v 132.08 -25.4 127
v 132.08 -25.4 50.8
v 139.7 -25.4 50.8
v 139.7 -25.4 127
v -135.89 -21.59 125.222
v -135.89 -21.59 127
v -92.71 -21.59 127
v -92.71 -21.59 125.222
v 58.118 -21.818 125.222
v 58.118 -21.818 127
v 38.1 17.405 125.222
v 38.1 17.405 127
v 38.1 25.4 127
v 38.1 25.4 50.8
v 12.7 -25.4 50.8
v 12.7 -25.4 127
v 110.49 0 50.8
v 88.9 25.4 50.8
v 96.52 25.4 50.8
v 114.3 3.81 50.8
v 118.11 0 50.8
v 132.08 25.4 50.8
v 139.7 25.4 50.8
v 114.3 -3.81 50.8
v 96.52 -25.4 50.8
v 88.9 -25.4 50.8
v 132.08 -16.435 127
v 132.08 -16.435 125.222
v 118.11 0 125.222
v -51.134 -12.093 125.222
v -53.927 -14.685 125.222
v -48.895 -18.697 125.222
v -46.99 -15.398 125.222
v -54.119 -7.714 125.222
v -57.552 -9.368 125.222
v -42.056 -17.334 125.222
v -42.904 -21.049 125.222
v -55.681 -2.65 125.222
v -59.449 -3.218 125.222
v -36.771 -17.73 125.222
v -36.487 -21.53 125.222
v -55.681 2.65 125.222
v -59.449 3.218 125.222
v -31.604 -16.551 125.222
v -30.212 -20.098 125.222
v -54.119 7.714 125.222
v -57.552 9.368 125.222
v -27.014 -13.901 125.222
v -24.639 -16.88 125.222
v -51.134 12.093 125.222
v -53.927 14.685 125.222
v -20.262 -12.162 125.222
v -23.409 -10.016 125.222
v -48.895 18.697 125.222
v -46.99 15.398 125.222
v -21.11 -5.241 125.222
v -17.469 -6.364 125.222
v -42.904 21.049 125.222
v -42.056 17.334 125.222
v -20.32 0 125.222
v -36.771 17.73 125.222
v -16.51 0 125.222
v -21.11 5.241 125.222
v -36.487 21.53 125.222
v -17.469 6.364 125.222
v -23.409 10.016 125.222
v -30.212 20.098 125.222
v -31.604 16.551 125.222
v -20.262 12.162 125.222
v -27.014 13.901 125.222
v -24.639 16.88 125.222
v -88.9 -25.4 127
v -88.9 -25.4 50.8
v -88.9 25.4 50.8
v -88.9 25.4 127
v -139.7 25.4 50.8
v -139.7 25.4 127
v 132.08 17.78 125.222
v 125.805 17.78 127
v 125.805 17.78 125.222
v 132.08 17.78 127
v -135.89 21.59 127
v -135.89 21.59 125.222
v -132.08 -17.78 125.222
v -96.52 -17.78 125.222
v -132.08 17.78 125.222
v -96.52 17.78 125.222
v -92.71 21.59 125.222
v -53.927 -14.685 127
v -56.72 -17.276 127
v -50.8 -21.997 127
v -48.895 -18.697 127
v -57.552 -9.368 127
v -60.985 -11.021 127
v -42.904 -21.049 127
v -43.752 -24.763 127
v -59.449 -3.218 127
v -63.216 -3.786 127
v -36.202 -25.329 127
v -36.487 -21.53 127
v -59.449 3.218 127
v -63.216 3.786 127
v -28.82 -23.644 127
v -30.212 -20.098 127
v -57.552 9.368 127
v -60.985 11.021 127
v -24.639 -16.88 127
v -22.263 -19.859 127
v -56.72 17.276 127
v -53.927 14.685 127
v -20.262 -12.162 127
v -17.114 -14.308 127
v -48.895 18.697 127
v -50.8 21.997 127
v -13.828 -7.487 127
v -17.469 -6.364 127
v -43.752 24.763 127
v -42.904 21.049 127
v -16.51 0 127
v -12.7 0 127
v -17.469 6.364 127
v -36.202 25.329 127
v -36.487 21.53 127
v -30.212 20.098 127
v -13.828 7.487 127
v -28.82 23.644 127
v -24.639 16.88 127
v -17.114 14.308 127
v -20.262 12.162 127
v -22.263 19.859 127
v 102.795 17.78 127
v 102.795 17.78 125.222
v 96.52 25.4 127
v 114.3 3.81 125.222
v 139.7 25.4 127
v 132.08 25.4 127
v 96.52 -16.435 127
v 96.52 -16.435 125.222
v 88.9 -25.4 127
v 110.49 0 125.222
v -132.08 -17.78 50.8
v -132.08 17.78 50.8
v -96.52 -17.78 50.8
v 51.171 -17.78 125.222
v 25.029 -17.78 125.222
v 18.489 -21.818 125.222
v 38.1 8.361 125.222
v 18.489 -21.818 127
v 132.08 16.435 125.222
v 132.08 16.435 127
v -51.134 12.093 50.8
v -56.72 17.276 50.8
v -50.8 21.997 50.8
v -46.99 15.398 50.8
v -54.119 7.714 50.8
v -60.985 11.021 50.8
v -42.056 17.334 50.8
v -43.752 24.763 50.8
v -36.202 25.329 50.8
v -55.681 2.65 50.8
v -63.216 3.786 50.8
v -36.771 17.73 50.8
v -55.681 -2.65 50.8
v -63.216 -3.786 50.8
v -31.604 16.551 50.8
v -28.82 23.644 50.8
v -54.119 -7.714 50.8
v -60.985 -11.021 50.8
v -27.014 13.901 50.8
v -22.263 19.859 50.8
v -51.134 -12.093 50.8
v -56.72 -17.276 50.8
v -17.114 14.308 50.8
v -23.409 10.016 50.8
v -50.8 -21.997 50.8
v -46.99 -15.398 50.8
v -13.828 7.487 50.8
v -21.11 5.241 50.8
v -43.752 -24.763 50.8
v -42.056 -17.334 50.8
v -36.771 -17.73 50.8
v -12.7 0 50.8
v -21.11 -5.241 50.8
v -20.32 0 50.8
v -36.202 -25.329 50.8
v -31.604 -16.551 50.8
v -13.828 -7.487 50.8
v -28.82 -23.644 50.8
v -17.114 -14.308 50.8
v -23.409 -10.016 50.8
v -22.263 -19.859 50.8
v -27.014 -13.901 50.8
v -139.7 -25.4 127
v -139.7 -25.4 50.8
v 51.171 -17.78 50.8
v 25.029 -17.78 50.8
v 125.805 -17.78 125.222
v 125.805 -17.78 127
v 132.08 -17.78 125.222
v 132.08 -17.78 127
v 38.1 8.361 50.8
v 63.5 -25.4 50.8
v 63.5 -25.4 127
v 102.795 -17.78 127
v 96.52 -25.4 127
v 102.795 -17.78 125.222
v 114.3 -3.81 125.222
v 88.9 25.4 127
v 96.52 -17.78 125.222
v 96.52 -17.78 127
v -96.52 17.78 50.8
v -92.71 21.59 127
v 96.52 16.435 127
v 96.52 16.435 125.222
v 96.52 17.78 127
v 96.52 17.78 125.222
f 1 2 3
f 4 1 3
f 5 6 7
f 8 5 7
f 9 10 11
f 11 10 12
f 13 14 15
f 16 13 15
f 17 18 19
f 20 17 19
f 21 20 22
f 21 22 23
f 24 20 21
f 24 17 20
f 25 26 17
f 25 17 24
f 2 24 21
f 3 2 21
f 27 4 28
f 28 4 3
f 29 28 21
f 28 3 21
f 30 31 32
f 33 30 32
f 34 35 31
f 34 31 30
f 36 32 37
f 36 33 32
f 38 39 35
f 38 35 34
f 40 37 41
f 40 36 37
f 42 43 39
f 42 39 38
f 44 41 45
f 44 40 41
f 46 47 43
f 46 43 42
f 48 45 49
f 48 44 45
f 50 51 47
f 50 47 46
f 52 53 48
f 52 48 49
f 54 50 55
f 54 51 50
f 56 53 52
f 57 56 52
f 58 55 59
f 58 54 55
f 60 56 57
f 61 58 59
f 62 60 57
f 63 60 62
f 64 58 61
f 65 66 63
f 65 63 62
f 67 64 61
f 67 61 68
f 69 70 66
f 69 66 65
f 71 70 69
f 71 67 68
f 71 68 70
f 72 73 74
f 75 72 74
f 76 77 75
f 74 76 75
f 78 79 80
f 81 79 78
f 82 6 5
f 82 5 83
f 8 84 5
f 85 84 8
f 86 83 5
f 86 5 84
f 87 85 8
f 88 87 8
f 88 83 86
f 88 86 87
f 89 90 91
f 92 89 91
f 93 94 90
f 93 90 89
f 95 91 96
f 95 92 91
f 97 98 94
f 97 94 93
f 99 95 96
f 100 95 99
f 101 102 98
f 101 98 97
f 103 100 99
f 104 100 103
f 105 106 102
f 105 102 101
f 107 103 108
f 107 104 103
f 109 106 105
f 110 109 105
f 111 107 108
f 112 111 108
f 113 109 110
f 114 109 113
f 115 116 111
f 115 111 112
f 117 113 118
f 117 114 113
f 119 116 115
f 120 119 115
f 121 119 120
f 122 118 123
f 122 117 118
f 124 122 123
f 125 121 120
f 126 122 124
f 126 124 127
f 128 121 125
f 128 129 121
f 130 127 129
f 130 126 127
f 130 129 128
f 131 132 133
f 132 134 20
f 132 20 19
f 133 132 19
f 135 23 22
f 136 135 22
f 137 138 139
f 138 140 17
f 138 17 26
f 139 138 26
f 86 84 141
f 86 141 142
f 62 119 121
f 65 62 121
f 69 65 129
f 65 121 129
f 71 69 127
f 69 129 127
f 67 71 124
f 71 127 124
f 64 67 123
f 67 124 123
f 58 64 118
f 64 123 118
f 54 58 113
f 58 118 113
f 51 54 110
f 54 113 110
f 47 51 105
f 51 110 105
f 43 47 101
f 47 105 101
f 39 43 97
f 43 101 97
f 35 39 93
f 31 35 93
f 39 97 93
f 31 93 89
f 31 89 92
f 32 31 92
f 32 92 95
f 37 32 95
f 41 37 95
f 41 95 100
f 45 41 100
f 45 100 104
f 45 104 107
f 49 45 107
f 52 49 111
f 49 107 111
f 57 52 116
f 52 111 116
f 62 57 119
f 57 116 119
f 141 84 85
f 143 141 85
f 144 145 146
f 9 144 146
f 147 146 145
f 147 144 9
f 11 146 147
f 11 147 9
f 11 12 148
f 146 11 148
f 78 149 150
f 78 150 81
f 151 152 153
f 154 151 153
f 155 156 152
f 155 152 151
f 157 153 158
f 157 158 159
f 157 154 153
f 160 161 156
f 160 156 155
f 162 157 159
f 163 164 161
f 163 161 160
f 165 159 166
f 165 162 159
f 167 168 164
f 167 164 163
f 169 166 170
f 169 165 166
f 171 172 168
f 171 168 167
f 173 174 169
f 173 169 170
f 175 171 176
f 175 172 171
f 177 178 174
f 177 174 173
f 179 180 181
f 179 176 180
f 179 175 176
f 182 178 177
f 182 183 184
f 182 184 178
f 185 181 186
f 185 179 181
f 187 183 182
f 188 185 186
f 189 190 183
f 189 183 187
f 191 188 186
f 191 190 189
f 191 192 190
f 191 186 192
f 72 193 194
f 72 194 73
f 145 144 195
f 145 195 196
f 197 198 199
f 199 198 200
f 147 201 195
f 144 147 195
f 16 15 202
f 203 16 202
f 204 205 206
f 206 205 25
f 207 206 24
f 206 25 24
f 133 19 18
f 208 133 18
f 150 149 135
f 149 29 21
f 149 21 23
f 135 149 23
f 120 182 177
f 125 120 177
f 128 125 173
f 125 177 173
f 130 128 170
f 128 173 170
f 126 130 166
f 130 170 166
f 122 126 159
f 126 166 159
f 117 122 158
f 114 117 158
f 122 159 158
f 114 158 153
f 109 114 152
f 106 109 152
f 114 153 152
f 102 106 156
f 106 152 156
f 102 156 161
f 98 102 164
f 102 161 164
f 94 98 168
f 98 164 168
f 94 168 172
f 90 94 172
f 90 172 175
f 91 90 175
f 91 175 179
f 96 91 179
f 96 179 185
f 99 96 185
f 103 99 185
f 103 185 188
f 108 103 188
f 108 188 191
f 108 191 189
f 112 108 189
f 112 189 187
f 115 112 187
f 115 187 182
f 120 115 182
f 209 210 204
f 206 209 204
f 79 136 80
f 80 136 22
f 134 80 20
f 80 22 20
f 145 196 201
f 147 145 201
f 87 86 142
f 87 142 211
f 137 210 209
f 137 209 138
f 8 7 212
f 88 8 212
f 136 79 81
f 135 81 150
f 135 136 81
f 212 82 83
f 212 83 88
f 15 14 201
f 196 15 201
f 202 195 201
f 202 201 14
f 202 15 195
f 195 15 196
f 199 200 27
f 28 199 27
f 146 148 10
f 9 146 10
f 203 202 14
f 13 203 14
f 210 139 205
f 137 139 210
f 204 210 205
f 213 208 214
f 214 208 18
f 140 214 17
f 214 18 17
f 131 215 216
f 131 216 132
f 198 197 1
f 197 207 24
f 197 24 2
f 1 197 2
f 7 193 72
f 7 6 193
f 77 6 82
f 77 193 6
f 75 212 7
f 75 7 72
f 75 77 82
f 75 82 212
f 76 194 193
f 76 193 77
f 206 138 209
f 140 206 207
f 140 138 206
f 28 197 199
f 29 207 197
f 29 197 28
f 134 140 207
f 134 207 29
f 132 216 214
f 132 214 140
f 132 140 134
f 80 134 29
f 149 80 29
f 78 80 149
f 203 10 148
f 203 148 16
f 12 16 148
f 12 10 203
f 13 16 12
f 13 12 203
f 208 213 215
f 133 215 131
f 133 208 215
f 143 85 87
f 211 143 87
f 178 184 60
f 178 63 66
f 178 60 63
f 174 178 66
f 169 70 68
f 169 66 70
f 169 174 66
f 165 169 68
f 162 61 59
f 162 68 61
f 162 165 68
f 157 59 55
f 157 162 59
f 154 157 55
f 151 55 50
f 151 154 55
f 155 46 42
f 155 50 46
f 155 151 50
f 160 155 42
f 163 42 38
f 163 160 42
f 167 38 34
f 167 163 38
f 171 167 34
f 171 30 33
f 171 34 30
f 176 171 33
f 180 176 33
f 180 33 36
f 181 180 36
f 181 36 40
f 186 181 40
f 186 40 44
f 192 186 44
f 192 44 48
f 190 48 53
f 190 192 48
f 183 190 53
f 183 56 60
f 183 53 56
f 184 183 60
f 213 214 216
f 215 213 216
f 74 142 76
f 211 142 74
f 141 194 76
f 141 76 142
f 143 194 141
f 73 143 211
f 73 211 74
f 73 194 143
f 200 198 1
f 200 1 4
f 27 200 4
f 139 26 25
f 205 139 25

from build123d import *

# Parameters (mm, degrees)
F0_W      = 279.4
F0_H      = 50.8
F1_DEPTH  = 25.4
F2_W      = 50.8
F2_H      = 50.8
F3_DEPTH  = 127
F4_W      = 35.56
F4_H      = 35.56
F5_DEPTH  = 127
F6_R      = 25.4
F6_R_2    = 17.78
F7_DEPTH  = 127
F9_DEPTH  = 127
F11_DEPTH = 127
F12_W     = 305.3418546915
F12_H     = 65.0082696229
F13_DEPTH = 76.2
F14_W     = 43.18
F14_H     = 43.18
F15_DEPTH = 1.778
F16_R     = 21.59
F17_DEPTH = 1.778
F19_DEPTH = 1.778
F20_W     = 35.56
F20_H     = 35.56
F21_DEPTH = 1.778


with BuildPart() as f1:
    # F0 (on Top) → F1 (new body)
    with BuildSketch(Plane.XY):
        Rectangle(F0_W, F0_H)
    extrude(amount=-F1_DEPTH)


with BuildPart() as f3:
    # F2 (on face) → F3 (new body)
    with BuildSketch(Plane.XY):
        with Locations((-114.3, 0)):
            Rectangle(F2_W, F2_H)
    extrude(amount=F3_DEPTH)

    # F4 (on face) → F5 (cut)
    with BuildSketch(Plane.XY.offset(127)):
        with Locations((-114.3, 0)):
            Rectangle(F4_W, F4_H)
    extrude(amount=-F5_DEPTH, mode=Mode.SUBTRACT)


with BuildPart() as f7:
    # F6 (on face) → F7 (new body)
    with BuildSketch(Plane.XY):
        with Locations((-38.1, 0)):
            Circle(F6_R)
        with Locations((-38.1, 0)):
            Circle(F6_R_2, mode=Mode.SUBTRACT)
    extrude(amount=F7_DEPTH)


with BuildPart() as f9:
    # F8 (on face) → F9 (new body)
    with BuildSketch(Plane.XY):
        Polygon((38.1, 25.4), (12.7, -25.4), (63.5, -25.4), align=None)
        Polygon((25.0294189943, -17.78), (38.1, 8.3611620115), (51.1705810057, -17.78), align=None, mode=Mode.SUBTRACT)
    extrude(amount=F9_DEPTH)


with BuildPart() as f11:
    # F10 (on face) → F11 (new body)
    with BuildSketch(Plane.XY):
        Polygon((110.49, 0), (88.9, -25.4), (96.52, -25.4), (114.3, -3.81), (132.08, -25.4), (139.7, -25.4), (118.11, 0), (139.7, 25.4), (132.08, 25.4), (114.3, 3.81), (96.52, 25.4), (88.9, 25.4), align=None)
    extrude(amount=F11_DEPTH)


with BuildPart() as f13_tool:
    # F12 (on face) → F13 (new body)
    with BuildSketch(Plane(origin=(0, 0, -25.4), x_dir=(1, 0, 0), z_dir=(0, 0, -1))):
        with Locations((1.4108642936, 1.3167178258)):
            Rectangle(F12_W, F12_H)
    extrude(amount=-F13_DEPTH)


with BuildPart() as f1_1:
    add(f1.part)

    # F13: cut by f13_tool
    add(f13_tool.part, mode=Mode.SUBTRACT)


with BuildPart() as f3_1:
    add(f3.part)

    # F13: cut by f13_tool
    add(f13_tool.part, mode=Mode.SUBTRACT)

    # F14 (on face) → F15 (cut)
    with BuildSketch(Plane.XY.offset(127)):
        with Locations((-114.3, 0)):
            Rectangle(F14_W, F14_H)
    extrude(amount=-F15_DEPTH, mode=Mode.SUBTRACT)


with BuildPart() as f7_1:
    add(f7.part)

    # F13: cut by f13_tool
    add(f13_tool.part, mode=Mode.SUBTRACT)

    # F16 (on face) → F17 (cut)
    with BuildSketch(Plane.XY.offset(127)):
        with Locations((-38.1, 0)):
            Circle(F16_R)
    extrude(amount=-F17_DEPTH, mode=Mode.SUBTRACT)


with BuildPart() as f9_1:
    add(f9.part)

    # F13: cut by f13_tool
    add(f13_tool.part, mode=Mode.SUBTRACT)

    # F18 (on face) → F19 (cut)
    with BuildSketch(Plane.XY.offset(127)):
        Polygon((58.1177063286, -21.8175202608), (38.1, 17.4045137824), (18.4889829784, -21.8175202608), align=None)
    extrude(amount=-F19_DEPTH, mode=Mode.SUBTRACT)


with BuildPart() as f11_1:
    add(f11.part)

    # F13: cut by f13_tool
    add(f13_tool.part, mode=Mode.SUBTRACT)

    # F20 (on face) → F21 (cut)
    with BuildSketch(Plane.XY.offset(127)):
        with Locations((114.3, 0)):
            Rectangle(F20_W, F20_H)
    extrude(amount=-F21_DEPTH, mode=Mode.SUBTRACT)


solid = Compound([f3_1.part, f7_1.part, f9_1.part, f11_1.part])
